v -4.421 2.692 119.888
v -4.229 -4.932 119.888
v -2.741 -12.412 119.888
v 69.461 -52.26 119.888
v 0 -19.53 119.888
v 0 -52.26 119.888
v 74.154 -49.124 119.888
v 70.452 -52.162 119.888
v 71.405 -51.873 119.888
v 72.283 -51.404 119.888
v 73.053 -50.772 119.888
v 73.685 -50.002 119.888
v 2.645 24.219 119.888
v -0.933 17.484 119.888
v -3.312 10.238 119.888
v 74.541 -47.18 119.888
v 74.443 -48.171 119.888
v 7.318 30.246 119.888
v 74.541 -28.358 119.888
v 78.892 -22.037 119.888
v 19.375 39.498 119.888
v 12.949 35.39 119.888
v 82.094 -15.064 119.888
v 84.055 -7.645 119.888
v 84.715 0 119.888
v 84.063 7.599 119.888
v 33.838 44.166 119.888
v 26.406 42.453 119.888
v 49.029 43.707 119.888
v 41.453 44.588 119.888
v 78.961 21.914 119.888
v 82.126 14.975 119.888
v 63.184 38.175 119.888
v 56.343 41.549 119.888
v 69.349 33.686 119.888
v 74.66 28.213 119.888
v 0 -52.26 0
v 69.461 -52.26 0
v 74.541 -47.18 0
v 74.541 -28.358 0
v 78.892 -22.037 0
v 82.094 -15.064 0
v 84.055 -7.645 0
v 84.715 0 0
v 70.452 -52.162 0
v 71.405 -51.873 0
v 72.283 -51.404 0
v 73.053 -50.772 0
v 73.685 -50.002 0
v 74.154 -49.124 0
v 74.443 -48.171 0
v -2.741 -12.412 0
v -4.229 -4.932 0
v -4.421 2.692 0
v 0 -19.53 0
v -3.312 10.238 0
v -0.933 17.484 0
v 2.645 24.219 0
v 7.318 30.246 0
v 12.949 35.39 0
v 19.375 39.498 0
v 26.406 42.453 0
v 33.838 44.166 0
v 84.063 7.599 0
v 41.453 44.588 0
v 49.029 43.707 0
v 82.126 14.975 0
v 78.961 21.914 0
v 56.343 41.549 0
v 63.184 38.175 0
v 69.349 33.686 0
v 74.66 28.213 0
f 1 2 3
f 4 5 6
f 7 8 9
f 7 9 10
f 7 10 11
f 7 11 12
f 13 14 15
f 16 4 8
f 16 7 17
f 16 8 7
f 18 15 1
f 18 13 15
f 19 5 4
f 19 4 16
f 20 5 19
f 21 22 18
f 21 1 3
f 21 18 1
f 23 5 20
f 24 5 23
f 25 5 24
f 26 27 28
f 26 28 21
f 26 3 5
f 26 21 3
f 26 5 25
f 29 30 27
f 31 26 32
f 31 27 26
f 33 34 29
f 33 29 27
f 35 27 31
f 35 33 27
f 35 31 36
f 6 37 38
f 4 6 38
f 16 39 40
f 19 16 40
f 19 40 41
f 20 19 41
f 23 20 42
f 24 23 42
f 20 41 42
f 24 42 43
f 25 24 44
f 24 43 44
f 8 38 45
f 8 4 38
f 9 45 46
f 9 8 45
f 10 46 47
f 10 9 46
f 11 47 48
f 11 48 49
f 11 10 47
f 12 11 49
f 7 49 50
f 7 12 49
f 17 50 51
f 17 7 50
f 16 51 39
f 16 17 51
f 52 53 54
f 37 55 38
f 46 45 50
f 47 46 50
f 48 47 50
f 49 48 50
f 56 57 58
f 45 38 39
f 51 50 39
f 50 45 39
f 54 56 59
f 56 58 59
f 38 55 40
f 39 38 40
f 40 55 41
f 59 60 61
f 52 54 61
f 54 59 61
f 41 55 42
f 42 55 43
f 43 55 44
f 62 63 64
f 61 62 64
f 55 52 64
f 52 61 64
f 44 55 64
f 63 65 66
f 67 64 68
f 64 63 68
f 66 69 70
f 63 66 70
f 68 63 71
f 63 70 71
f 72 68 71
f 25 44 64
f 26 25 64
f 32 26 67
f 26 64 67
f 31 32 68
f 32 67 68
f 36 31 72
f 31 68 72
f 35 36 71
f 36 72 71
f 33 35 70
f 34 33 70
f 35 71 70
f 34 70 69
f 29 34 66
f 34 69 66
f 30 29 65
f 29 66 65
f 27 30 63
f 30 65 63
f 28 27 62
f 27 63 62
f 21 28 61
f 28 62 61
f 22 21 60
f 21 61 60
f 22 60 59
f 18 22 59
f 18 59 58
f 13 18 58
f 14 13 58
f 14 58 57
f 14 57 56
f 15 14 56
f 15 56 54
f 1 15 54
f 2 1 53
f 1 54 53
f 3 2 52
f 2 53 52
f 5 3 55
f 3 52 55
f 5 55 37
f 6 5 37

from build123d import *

# Parameters (mm, degrees)
F1_DEPTH = 119.888
F2_R     = 5.08


with BuildPart() as f1:
    # F0 (on Top) → F1 (new body)
    with BuildSketch(Plane.XY):
        with BuildLine():
            Line((0, -19.529681), (0, 0))
            Line((0, 0), (74.540958, 0))
            Line((74.540958, 0), (74.540958, -28.357976))
            ThreePointArc((74.540958, -28.357976), (82.094388, -15.063883), (84.714819, 0))
            ThreePointArc((84.714819, 0), (30.085314, 43.468405), (0, -19.529681))
        make_face()
        with BuildLine():
            Line((74.540958, 0), (0, 0))
            Line((0, 0), (0, -19.529681))
            ThreePointArc((0, -19.529681), (34.859712, -44.298934), (74.540958, -28.357976))
            Line((74.540958, -28.357976), (74.540958, 0))
        make_face()
        with BuildLine():
            ThreePointArc((74.540958, -28.357976), (34.859712, -44.298934), (0, -19.529681))
            Line((0, -19.529681), (0, -52.259699))
            Line((0, -52.259699), (74.540958, -52.259699))
            Line((74.540958, -52.259699), (74.540958, -28.357976))
        make_face()
    extrude(amount=F1_DEPTH)

    # F2
    f2_edges = [f1.edges().sort_by_distance(p)[0] for p in [
        (74.540958, -52.259699, 59.944),
    ]]
    fillet(f2_edges, radius=F2_R)


solid = f1.part
